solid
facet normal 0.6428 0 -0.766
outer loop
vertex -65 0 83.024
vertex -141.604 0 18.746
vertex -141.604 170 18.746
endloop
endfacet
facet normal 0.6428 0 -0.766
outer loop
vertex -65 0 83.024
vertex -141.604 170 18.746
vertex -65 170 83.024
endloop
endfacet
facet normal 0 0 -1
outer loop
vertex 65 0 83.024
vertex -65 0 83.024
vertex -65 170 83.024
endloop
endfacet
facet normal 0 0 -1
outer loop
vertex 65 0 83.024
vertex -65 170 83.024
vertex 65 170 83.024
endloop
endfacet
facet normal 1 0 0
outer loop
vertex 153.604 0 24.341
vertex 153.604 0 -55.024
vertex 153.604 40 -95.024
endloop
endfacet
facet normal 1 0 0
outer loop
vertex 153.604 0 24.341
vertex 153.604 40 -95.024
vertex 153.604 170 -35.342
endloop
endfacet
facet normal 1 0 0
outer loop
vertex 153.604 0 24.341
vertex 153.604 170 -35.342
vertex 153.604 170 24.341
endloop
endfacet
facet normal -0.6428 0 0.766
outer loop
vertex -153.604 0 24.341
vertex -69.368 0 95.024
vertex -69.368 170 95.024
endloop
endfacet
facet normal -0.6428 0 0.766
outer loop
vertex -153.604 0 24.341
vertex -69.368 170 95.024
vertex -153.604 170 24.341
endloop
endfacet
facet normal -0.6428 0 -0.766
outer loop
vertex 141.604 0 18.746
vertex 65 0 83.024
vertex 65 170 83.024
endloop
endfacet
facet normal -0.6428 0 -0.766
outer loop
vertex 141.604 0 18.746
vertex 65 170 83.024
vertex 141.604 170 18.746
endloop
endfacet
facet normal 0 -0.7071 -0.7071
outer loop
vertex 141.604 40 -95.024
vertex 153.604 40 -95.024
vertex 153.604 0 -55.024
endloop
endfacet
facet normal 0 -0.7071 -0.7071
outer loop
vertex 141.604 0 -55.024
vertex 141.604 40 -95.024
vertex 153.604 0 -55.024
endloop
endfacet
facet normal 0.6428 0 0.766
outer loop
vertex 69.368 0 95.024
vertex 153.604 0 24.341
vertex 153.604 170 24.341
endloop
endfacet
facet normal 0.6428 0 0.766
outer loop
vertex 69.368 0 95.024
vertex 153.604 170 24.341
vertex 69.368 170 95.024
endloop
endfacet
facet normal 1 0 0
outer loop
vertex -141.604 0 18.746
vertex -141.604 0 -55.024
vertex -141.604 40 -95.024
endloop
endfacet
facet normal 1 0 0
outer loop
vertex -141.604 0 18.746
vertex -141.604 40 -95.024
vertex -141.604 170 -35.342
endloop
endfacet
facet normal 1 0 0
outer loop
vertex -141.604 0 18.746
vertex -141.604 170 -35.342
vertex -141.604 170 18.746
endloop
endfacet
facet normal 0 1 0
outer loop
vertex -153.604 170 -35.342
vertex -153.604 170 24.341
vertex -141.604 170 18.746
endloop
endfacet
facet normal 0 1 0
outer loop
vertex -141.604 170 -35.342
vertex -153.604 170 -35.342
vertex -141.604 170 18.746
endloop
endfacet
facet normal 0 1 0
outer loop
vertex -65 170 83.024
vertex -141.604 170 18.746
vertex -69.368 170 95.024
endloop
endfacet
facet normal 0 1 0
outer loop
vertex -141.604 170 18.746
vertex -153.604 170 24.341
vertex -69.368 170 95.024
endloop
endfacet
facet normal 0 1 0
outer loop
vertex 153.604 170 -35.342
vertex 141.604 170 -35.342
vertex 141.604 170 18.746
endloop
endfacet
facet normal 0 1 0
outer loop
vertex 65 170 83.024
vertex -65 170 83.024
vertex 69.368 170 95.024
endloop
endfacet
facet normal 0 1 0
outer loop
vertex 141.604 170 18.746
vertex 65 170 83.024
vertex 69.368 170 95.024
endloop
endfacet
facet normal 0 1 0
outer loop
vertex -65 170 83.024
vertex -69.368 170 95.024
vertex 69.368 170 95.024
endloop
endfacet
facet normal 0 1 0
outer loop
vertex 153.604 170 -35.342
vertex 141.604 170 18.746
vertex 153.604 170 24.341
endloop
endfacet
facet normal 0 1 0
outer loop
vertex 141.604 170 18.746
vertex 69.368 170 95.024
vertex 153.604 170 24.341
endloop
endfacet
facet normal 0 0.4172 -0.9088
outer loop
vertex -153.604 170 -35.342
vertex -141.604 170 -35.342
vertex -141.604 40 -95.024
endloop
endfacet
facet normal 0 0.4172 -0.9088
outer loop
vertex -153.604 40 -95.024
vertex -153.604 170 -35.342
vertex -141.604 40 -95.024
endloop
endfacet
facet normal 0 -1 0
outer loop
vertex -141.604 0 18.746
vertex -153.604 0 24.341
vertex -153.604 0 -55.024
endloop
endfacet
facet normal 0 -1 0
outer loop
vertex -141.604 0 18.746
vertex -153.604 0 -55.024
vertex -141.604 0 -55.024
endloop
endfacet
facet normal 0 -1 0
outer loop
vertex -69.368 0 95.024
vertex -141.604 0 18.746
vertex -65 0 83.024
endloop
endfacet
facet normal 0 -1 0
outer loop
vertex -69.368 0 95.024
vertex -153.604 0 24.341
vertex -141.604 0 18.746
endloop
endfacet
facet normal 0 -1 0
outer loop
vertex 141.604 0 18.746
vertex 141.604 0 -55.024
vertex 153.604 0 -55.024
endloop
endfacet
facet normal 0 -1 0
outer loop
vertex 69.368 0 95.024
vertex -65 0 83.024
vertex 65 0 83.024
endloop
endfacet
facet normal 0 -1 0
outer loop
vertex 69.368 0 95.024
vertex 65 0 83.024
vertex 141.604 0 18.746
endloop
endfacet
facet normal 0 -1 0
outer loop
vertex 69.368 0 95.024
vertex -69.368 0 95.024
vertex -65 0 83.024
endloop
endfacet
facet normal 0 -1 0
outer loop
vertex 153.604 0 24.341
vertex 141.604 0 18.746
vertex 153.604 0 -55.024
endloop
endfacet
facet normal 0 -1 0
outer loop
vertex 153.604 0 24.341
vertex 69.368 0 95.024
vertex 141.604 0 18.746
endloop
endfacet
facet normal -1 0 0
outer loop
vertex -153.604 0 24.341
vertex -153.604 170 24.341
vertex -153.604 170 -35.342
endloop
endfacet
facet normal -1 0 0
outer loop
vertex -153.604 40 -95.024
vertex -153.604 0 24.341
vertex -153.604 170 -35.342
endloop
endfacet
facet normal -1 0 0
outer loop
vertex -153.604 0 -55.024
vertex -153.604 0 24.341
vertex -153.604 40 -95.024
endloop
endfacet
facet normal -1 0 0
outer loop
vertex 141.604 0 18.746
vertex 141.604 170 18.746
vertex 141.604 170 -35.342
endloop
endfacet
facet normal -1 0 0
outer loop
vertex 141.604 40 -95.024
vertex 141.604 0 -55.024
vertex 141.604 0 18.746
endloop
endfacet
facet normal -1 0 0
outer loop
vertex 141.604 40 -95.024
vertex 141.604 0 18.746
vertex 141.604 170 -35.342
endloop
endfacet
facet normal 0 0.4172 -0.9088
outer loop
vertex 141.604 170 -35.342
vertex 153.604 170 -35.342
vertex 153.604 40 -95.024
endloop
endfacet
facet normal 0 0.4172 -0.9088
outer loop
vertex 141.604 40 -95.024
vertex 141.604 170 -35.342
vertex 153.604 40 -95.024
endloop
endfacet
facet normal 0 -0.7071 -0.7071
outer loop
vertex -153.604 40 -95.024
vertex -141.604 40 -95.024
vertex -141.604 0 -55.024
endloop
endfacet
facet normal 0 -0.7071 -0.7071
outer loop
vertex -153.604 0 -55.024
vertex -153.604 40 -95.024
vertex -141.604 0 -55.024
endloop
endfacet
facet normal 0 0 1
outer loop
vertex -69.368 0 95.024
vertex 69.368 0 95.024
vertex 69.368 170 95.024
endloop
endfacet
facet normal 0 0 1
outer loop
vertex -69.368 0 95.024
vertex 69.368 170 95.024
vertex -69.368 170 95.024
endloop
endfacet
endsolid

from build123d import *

# Parameters (mm, degrees)
F1_DEPTH = 170
F3_DEPTH = 350
F5_DEPTH = 400


with BuildPart() as f1:
    # F0 (on Front) → F1 (new body)
    with BuildSketch(Plane.XZ):
        Polygon((-141.604444, 18.745599), (-65, 83.02436), (65, 83.02436), (141.604444, 18.745599), (141.604444, -95.024361), (153.604444, -95.024361), (153.604444, 24.341291), (69.367643, 95.02436), (-69.367643, 95.02436), (-153.604444, 24.341291), (-153.604444, -95.024361), (-141.604444, -95.024361), align=None)
    extrude(amount=-F1_DEPTH)

    # F2 (on face) → F3 (cut)
    with BuildSketch(Plane.YZ.offset(153.604444)):
        Polygon((170, -35.341535), (40, -95.024361), (170, -95.024361), align=None)
    extrude(amount=-F3_DEPTH, mode=Mode.SUBTRACT)

    # F4 (on face) → F5 (cut)
    with BuildSketch(Plane.YZ.offset(153.604444)):
        Polygon((0, -95.024361), (40, -95.024361), (0, -55.024361), align=None)
    extrude(amount=-F5_DEPTH, mode=Mode.SUBTRACT)


solid = f1.part
